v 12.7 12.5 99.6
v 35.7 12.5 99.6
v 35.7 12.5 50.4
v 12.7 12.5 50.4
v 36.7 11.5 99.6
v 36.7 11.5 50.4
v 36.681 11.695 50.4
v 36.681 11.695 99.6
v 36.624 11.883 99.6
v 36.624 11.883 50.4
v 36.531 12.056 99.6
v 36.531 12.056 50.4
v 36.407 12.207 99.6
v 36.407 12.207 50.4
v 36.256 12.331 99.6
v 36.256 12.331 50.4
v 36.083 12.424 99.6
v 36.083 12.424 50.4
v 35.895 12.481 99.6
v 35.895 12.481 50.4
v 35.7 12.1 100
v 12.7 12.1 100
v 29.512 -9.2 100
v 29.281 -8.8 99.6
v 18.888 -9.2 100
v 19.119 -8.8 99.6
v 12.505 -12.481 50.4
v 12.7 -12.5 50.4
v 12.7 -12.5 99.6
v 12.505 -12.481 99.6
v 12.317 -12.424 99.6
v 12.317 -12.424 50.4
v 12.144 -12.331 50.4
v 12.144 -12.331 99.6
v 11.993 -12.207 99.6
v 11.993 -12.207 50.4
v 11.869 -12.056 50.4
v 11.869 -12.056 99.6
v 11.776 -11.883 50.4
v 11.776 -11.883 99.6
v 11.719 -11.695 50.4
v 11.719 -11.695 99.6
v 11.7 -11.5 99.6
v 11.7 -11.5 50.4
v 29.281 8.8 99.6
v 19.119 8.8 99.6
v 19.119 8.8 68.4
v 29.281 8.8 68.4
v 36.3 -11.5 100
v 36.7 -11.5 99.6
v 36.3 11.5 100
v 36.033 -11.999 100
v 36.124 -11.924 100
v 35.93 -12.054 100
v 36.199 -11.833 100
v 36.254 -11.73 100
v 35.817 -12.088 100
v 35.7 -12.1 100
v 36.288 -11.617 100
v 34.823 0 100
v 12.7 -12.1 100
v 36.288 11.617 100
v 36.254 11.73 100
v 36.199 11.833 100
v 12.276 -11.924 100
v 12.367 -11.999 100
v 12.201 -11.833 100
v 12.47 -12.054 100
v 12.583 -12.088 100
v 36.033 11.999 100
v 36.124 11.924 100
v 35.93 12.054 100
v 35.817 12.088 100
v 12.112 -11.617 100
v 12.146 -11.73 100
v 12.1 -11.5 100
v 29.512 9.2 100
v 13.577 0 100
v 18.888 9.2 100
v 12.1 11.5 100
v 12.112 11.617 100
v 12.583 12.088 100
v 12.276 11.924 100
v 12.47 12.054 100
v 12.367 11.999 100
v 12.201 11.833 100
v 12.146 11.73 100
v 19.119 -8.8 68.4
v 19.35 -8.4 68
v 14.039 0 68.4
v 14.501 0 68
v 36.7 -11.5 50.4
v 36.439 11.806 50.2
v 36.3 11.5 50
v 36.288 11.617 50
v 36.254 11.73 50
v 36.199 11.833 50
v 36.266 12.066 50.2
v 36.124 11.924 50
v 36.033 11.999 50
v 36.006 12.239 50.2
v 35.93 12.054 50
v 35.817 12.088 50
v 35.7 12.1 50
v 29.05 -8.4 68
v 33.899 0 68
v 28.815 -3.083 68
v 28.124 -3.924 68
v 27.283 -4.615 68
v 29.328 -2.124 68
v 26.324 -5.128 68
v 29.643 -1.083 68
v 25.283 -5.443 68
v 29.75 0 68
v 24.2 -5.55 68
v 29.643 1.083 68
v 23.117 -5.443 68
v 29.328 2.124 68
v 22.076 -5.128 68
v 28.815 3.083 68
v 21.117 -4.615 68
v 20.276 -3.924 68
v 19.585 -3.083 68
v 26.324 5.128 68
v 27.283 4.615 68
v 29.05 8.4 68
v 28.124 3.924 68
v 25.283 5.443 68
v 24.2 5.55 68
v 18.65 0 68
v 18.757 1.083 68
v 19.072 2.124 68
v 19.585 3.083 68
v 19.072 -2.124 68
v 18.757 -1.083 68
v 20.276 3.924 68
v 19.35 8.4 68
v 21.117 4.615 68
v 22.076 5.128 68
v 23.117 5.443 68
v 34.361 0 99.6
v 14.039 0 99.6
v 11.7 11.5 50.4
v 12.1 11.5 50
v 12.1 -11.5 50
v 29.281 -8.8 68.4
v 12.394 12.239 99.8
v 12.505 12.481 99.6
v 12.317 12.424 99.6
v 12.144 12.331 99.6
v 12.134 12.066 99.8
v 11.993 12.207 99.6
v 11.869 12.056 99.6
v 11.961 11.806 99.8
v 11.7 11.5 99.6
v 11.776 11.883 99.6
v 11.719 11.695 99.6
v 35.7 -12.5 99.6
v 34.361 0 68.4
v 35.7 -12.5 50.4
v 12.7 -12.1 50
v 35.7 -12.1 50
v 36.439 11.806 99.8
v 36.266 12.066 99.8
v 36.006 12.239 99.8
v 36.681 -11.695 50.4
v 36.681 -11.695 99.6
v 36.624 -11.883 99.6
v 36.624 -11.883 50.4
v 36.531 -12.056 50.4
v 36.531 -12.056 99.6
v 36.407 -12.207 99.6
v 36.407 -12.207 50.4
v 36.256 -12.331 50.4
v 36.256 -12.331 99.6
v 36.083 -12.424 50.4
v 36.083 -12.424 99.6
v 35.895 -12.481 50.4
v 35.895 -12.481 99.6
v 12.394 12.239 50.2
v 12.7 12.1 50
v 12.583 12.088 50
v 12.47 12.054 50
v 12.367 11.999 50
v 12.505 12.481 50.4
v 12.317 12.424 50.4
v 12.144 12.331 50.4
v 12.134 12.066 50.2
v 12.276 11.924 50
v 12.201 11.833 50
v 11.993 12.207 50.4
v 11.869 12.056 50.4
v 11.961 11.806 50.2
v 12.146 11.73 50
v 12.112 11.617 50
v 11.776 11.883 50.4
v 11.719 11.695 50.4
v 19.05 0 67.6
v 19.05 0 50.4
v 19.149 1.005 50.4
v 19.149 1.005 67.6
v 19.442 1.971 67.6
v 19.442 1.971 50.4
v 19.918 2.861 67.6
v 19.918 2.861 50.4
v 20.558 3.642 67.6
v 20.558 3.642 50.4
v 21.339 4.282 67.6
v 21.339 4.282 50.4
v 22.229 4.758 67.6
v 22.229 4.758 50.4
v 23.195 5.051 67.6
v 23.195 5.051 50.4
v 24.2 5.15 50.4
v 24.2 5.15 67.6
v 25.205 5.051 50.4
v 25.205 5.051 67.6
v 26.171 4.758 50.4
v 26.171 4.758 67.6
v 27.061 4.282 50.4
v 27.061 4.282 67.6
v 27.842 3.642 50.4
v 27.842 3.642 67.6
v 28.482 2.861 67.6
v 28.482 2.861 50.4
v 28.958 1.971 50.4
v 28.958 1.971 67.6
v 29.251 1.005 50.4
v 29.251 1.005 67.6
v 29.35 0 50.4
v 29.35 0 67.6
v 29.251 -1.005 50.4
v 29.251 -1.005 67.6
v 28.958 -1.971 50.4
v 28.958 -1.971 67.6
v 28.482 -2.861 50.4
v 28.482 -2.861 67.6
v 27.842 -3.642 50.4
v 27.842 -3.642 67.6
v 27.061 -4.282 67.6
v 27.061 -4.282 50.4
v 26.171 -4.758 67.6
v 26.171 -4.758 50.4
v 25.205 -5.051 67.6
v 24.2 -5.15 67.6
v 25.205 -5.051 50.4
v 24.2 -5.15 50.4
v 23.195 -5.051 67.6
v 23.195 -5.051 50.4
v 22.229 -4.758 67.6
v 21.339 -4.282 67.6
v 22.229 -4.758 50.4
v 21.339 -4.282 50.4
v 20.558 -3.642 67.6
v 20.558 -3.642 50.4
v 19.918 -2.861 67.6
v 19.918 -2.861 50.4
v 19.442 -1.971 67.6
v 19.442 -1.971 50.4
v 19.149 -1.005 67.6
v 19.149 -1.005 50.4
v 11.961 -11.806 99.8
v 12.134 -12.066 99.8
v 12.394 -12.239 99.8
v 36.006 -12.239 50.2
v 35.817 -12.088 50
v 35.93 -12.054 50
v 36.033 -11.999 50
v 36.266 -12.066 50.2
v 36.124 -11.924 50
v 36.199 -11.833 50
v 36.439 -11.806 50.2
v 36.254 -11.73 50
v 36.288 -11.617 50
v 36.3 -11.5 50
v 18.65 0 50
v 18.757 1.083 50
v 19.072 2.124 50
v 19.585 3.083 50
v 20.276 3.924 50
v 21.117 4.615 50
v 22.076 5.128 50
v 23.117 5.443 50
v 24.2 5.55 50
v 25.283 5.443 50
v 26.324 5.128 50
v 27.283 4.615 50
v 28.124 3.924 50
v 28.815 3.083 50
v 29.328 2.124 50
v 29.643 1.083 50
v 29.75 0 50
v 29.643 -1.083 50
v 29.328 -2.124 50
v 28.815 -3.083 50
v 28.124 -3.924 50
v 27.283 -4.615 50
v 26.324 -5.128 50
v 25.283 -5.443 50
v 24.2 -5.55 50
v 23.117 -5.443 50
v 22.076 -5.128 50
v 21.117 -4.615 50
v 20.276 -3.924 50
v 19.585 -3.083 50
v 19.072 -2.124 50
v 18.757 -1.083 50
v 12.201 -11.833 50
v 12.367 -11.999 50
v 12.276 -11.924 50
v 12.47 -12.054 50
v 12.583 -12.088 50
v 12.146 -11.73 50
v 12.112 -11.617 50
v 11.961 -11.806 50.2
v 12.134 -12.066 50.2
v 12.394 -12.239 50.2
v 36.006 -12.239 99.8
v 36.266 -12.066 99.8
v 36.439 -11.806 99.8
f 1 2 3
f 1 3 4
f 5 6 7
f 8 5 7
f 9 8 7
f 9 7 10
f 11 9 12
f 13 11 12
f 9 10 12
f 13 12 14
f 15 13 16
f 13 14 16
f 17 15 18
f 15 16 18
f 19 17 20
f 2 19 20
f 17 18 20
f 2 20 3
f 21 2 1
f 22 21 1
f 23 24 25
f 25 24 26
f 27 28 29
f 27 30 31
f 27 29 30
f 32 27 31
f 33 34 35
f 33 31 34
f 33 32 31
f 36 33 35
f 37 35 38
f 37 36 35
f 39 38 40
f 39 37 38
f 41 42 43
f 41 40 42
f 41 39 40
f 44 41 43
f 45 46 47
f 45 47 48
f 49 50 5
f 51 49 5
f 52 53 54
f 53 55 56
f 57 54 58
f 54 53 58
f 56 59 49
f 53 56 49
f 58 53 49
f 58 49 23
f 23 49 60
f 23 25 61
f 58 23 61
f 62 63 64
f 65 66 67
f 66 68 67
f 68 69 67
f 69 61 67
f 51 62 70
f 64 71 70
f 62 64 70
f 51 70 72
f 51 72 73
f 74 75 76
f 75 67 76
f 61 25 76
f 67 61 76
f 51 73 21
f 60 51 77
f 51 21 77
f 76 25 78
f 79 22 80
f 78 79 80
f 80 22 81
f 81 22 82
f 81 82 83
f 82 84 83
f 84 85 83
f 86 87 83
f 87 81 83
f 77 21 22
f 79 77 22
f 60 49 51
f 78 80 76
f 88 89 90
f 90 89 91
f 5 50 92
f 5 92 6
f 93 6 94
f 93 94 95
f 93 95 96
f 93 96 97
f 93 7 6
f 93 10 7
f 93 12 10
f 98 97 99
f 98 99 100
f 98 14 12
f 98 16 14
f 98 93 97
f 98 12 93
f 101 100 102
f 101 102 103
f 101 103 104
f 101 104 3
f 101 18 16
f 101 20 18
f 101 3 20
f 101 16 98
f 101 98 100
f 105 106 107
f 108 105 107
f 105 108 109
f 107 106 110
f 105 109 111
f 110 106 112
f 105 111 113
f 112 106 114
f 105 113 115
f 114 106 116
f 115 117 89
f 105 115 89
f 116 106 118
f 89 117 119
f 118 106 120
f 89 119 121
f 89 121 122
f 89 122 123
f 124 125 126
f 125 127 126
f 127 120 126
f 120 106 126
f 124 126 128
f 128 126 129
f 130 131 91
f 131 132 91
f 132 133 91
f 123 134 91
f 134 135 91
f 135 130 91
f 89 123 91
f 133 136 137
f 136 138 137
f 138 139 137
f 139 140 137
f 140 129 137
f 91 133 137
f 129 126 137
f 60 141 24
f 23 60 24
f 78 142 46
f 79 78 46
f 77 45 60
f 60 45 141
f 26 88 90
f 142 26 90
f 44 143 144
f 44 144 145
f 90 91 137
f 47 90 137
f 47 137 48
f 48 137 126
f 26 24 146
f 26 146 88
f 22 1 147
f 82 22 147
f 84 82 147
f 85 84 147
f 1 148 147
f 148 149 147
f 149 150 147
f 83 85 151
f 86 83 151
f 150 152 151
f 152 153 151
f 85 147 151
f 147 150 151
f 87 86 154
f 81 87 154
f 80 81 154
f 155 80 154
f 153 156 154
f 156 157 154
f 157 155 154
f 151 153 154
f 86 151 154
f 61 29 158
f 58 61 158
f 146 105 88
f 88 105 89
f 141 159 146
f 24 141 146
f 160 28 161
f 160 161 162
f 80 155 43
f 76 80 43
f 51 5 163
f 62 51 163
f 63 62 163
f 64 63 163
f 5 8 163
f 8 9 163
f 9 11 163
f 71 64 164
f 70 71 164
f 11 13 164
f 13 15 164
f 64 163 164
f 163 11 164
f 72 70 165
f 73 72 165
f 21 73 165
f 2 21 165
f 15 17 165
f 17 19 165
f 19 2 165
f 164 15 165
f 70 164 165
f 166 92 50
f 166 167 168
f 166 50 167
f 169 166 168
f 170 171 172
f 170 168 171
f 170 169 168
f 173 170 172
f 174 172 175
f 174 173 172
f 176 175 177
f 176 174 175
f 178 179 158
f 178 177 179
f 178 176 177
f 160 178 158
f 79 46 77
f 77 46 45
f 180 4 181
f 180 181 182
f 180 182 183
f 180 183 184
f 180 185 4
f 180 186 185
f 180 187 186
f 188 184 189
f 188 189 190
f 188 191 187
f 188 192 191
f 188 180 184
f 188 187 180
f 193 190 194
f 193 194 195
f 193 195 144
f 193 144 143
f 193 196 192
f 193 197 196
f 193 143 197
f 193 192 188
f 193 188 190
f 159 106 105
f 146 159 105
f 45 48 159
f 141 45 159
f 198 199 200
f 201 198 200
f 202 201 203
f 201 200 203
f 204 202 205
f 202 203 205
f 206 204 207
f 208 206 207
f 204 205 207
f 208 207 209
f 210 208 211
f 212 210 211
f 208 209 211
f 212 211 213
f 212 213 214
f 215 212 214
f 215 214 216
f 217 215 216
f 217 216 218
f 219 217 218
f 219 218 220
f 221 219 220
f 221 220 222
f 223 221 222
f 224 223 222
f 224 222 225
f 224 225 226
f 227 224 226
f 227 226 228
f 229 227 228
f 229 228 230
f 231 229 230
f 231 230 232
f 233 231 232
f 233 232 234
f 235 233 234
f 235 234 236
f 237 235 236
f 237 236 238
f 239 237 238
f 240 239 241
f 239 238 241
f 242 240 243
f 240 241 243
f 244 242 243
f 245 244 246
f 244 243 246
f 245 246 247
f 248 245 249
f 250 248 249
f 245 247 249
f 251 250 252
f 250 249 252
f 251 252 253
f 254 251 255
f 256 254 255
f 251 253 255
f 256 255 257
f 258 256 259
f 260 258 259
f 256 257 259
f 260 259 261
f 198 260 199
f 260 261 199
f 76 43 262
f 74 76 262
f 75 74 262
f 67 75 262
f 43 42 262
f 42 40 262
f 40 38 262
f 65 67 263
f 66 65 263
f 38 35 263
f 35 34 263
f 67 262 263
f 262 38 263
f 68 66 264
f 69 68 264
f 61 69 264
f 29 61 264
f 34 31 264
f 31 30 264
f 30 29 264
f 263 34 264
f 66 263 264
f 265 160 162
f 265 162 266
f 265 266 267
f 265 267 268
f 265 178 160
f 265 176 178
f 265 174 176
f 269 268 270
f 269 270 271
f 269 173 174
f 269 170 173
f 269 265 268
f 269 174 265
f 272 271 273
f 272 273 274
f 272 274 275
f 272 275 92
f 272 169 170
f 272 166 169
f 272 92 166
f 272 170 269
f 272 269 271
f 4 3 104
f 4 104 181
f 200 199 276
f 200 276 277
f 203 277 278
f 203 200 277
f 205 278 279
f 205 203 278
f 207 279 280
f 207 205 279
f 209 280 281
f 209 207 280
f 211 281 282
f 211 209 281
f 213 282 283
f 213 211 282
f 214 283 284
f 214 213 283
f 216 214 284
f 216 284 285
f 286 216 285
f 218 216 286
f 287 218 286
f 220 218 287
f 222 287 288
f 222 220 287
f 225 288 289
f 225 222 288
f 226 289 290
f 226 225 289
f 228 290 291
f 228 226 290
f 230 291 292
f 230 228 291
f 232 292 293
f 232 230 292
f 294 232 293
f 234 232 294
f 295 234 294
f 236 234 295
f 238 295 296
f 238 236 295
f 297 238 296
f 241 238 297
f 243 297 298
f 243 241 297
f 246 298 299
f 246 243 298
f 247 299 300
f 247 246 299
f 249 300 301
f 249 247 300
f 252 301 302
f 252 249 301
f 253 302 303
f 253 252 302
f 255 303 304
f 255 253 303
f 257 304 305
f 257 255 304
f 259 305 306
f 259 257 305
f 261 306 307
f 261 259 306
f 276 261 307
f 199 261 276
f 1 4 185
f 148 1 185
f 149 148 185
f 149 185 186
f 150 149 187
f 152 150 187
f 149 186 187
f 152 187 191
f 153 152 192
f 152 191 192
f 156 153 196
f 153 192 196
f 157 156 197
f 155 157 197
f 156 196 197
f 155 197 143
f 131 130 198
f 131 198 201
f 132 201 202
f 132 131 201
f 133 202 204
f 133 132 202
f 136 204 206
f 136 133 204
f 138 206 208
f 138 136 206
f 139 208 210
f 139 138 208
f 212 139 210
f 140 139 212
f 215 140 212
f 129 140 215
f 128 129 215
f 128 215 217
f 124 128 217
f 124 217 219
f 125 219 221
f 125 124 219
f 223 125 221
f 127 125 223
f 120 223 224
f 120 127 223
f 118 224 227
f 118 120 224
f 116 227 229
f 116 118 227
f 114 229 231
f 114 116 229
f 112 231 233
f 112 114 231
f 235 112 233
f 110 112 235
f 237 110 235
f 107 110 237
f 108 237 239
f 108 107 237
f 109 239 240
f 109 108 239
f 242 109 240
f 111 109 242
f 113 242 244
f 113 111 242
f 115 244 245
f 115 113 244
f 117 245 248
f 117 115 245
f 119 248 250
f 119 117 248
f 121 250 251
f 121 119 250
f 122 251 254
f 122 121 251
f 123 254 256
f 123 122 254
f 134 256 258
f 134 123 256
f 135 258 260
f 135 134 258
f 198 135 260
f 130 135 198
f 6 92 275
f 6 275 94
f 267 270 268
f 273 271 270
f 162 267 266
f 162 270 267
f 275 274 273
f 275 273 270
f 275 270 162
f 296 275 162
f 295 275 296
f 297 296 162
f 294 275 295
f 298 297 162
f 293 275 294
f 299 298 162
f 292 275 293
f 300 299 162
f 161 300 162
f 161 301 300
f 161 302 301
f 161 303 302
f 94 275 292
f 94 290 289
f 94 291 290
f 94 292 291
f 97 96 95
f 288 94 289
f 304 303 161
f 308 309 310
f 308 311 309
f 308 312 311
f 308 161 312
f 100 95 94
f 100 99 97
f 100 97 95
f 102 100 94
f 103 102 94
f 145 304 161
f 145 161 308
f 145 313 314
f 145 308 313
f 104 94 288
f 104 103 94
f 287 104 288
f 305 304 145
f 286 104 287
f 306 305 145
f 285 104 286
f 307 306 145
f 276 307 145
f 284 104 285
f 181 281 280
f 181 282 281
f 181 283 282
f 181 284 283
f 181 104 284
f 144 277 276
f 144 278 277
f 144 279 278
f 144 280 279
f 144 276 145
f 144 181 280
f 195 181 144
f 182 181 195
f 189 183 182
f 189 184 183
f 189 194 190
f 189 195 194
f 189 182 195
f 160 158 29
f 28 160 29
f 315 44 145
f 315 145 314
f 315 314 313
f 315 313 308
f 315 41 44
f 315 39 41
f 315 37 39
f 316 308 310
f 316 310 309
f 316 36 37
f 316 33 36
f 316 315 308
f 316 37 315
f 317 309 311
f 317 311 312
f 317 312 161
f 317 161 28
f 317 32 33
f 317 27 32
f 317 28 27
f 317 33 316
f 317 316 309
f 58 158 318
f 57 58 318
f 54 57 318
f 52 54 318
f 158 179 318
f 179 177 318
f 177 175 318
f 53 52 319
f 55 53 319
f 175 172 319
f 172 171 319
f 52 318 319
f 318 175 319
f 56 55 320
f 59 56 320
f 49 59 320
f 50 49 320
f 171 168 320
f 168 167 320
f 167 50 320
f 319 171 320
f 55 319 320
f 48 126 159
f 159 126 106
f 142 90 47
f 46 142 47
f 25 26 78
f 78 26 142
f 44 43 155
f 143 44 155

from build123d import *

# Parameters (mm, degrees)
F0_W     = 25
F0_H     = 25
F1_DEPTH = 50
F2_R     = 5.15
F3_DEPTH = 50.001
F5_START = -18
F4_R     = 5.15
F5_DEPTH = 32.001
F6_R     = 1
F7_SIZE  = 0.4
F8_ANGLE = 180


with BuildPart() as f1:
    # F0 (on Top) → F1 (new body)
    with BuildSketch(Plane.XY):
        Rectangle(F0_W, F0_H)
    extrude(amount=F1_DEPTH)

    # F2 (on face) → F3 (cut, through all)
    with BuildSketch(Plane.XY.offset(50)):
        Circle(F2_R)
    extrude(amount=-F3_DEPTH, mode=Mode.SUBTRACT)

    # F4 (on face) → F5 (cut)
    with BuildSketch(Plane.XY.offset(50).offset(F5_START)):
        Polygon((5.0806823689, 8.8), (-5.0806823689, 8.8), (-10.1613647377, 0), (-5.0806823689, -8.8), (5.0806823689, -8.8), (10.1613647377, 0), align=None)
        Circle(F4_R, mode=Mode.SUBTRACT)
    extrude(amount=-F5_DEPTH, mode=Mode.SUBTRACT)

    # F6
    f6_edges = [f1.edges().sort_by_distance(p)[0] for p in [
        (-12.5, 12.5, 25),
        (-12.5, -12.5, 25),
        (12.5, 12.5, 25),
        (12.5, -12.5, 25),
    ]]
    fillet(f6_edges, radius=F6_R)

    # F7
    f7_edges = [f1.edges().sort_by_distance(p)[0] for p in [
        (0, 12.5, 0),
        (12.207107, 12.207107, 0),
        (-12.207107, 12.207107, 0),
        (12.5, 0, 0),
        (-12.5, 0, 0),
        (12.207107, -12.207107, 0),
        (-12.207107, -12.207107, 0),
        (0, -12.5, 0),
        (7.621024, 4.4, 0),
        (0, 8.8, 0),
        (-7.621024, 4.4, 0),
        (-7.621024, -4.4, 0),
        (0, -8.8, 0),
        (7.621024, -4.4, 0),
        (0, 12.5, 50),
        (12.207107, 12.207107, 50),
        (-12.207107, 12.207107, 50),
        (12.5, 0, 50),
        (-12.5, 0, 50),
        (12.207107, -12.207107, 50),
        (-12.207107, -12.207107, 50),
        (0, -12.5, 50),
        (-5.15, 0, 50),
        (7.621024, 4.4, 32),
        (0, 8.8, 32),
        (-7.621024, 4.4, 32),
        (-7.621024, -4.4, 32),
        (0, -8.8, 32),
        (7.621024, -4.4, 32),
        (-5.15, 0, 32),
    ]]
    chamfer(f7_edges, length=F7_SIZE)


with BuildPart() as f1_1:
    # F8: moved
    add(f1.part.rotate(Axis((12.1, 0, 50), (0, -1, 0)), F8_ANGLE))


solid = f1_1.part
